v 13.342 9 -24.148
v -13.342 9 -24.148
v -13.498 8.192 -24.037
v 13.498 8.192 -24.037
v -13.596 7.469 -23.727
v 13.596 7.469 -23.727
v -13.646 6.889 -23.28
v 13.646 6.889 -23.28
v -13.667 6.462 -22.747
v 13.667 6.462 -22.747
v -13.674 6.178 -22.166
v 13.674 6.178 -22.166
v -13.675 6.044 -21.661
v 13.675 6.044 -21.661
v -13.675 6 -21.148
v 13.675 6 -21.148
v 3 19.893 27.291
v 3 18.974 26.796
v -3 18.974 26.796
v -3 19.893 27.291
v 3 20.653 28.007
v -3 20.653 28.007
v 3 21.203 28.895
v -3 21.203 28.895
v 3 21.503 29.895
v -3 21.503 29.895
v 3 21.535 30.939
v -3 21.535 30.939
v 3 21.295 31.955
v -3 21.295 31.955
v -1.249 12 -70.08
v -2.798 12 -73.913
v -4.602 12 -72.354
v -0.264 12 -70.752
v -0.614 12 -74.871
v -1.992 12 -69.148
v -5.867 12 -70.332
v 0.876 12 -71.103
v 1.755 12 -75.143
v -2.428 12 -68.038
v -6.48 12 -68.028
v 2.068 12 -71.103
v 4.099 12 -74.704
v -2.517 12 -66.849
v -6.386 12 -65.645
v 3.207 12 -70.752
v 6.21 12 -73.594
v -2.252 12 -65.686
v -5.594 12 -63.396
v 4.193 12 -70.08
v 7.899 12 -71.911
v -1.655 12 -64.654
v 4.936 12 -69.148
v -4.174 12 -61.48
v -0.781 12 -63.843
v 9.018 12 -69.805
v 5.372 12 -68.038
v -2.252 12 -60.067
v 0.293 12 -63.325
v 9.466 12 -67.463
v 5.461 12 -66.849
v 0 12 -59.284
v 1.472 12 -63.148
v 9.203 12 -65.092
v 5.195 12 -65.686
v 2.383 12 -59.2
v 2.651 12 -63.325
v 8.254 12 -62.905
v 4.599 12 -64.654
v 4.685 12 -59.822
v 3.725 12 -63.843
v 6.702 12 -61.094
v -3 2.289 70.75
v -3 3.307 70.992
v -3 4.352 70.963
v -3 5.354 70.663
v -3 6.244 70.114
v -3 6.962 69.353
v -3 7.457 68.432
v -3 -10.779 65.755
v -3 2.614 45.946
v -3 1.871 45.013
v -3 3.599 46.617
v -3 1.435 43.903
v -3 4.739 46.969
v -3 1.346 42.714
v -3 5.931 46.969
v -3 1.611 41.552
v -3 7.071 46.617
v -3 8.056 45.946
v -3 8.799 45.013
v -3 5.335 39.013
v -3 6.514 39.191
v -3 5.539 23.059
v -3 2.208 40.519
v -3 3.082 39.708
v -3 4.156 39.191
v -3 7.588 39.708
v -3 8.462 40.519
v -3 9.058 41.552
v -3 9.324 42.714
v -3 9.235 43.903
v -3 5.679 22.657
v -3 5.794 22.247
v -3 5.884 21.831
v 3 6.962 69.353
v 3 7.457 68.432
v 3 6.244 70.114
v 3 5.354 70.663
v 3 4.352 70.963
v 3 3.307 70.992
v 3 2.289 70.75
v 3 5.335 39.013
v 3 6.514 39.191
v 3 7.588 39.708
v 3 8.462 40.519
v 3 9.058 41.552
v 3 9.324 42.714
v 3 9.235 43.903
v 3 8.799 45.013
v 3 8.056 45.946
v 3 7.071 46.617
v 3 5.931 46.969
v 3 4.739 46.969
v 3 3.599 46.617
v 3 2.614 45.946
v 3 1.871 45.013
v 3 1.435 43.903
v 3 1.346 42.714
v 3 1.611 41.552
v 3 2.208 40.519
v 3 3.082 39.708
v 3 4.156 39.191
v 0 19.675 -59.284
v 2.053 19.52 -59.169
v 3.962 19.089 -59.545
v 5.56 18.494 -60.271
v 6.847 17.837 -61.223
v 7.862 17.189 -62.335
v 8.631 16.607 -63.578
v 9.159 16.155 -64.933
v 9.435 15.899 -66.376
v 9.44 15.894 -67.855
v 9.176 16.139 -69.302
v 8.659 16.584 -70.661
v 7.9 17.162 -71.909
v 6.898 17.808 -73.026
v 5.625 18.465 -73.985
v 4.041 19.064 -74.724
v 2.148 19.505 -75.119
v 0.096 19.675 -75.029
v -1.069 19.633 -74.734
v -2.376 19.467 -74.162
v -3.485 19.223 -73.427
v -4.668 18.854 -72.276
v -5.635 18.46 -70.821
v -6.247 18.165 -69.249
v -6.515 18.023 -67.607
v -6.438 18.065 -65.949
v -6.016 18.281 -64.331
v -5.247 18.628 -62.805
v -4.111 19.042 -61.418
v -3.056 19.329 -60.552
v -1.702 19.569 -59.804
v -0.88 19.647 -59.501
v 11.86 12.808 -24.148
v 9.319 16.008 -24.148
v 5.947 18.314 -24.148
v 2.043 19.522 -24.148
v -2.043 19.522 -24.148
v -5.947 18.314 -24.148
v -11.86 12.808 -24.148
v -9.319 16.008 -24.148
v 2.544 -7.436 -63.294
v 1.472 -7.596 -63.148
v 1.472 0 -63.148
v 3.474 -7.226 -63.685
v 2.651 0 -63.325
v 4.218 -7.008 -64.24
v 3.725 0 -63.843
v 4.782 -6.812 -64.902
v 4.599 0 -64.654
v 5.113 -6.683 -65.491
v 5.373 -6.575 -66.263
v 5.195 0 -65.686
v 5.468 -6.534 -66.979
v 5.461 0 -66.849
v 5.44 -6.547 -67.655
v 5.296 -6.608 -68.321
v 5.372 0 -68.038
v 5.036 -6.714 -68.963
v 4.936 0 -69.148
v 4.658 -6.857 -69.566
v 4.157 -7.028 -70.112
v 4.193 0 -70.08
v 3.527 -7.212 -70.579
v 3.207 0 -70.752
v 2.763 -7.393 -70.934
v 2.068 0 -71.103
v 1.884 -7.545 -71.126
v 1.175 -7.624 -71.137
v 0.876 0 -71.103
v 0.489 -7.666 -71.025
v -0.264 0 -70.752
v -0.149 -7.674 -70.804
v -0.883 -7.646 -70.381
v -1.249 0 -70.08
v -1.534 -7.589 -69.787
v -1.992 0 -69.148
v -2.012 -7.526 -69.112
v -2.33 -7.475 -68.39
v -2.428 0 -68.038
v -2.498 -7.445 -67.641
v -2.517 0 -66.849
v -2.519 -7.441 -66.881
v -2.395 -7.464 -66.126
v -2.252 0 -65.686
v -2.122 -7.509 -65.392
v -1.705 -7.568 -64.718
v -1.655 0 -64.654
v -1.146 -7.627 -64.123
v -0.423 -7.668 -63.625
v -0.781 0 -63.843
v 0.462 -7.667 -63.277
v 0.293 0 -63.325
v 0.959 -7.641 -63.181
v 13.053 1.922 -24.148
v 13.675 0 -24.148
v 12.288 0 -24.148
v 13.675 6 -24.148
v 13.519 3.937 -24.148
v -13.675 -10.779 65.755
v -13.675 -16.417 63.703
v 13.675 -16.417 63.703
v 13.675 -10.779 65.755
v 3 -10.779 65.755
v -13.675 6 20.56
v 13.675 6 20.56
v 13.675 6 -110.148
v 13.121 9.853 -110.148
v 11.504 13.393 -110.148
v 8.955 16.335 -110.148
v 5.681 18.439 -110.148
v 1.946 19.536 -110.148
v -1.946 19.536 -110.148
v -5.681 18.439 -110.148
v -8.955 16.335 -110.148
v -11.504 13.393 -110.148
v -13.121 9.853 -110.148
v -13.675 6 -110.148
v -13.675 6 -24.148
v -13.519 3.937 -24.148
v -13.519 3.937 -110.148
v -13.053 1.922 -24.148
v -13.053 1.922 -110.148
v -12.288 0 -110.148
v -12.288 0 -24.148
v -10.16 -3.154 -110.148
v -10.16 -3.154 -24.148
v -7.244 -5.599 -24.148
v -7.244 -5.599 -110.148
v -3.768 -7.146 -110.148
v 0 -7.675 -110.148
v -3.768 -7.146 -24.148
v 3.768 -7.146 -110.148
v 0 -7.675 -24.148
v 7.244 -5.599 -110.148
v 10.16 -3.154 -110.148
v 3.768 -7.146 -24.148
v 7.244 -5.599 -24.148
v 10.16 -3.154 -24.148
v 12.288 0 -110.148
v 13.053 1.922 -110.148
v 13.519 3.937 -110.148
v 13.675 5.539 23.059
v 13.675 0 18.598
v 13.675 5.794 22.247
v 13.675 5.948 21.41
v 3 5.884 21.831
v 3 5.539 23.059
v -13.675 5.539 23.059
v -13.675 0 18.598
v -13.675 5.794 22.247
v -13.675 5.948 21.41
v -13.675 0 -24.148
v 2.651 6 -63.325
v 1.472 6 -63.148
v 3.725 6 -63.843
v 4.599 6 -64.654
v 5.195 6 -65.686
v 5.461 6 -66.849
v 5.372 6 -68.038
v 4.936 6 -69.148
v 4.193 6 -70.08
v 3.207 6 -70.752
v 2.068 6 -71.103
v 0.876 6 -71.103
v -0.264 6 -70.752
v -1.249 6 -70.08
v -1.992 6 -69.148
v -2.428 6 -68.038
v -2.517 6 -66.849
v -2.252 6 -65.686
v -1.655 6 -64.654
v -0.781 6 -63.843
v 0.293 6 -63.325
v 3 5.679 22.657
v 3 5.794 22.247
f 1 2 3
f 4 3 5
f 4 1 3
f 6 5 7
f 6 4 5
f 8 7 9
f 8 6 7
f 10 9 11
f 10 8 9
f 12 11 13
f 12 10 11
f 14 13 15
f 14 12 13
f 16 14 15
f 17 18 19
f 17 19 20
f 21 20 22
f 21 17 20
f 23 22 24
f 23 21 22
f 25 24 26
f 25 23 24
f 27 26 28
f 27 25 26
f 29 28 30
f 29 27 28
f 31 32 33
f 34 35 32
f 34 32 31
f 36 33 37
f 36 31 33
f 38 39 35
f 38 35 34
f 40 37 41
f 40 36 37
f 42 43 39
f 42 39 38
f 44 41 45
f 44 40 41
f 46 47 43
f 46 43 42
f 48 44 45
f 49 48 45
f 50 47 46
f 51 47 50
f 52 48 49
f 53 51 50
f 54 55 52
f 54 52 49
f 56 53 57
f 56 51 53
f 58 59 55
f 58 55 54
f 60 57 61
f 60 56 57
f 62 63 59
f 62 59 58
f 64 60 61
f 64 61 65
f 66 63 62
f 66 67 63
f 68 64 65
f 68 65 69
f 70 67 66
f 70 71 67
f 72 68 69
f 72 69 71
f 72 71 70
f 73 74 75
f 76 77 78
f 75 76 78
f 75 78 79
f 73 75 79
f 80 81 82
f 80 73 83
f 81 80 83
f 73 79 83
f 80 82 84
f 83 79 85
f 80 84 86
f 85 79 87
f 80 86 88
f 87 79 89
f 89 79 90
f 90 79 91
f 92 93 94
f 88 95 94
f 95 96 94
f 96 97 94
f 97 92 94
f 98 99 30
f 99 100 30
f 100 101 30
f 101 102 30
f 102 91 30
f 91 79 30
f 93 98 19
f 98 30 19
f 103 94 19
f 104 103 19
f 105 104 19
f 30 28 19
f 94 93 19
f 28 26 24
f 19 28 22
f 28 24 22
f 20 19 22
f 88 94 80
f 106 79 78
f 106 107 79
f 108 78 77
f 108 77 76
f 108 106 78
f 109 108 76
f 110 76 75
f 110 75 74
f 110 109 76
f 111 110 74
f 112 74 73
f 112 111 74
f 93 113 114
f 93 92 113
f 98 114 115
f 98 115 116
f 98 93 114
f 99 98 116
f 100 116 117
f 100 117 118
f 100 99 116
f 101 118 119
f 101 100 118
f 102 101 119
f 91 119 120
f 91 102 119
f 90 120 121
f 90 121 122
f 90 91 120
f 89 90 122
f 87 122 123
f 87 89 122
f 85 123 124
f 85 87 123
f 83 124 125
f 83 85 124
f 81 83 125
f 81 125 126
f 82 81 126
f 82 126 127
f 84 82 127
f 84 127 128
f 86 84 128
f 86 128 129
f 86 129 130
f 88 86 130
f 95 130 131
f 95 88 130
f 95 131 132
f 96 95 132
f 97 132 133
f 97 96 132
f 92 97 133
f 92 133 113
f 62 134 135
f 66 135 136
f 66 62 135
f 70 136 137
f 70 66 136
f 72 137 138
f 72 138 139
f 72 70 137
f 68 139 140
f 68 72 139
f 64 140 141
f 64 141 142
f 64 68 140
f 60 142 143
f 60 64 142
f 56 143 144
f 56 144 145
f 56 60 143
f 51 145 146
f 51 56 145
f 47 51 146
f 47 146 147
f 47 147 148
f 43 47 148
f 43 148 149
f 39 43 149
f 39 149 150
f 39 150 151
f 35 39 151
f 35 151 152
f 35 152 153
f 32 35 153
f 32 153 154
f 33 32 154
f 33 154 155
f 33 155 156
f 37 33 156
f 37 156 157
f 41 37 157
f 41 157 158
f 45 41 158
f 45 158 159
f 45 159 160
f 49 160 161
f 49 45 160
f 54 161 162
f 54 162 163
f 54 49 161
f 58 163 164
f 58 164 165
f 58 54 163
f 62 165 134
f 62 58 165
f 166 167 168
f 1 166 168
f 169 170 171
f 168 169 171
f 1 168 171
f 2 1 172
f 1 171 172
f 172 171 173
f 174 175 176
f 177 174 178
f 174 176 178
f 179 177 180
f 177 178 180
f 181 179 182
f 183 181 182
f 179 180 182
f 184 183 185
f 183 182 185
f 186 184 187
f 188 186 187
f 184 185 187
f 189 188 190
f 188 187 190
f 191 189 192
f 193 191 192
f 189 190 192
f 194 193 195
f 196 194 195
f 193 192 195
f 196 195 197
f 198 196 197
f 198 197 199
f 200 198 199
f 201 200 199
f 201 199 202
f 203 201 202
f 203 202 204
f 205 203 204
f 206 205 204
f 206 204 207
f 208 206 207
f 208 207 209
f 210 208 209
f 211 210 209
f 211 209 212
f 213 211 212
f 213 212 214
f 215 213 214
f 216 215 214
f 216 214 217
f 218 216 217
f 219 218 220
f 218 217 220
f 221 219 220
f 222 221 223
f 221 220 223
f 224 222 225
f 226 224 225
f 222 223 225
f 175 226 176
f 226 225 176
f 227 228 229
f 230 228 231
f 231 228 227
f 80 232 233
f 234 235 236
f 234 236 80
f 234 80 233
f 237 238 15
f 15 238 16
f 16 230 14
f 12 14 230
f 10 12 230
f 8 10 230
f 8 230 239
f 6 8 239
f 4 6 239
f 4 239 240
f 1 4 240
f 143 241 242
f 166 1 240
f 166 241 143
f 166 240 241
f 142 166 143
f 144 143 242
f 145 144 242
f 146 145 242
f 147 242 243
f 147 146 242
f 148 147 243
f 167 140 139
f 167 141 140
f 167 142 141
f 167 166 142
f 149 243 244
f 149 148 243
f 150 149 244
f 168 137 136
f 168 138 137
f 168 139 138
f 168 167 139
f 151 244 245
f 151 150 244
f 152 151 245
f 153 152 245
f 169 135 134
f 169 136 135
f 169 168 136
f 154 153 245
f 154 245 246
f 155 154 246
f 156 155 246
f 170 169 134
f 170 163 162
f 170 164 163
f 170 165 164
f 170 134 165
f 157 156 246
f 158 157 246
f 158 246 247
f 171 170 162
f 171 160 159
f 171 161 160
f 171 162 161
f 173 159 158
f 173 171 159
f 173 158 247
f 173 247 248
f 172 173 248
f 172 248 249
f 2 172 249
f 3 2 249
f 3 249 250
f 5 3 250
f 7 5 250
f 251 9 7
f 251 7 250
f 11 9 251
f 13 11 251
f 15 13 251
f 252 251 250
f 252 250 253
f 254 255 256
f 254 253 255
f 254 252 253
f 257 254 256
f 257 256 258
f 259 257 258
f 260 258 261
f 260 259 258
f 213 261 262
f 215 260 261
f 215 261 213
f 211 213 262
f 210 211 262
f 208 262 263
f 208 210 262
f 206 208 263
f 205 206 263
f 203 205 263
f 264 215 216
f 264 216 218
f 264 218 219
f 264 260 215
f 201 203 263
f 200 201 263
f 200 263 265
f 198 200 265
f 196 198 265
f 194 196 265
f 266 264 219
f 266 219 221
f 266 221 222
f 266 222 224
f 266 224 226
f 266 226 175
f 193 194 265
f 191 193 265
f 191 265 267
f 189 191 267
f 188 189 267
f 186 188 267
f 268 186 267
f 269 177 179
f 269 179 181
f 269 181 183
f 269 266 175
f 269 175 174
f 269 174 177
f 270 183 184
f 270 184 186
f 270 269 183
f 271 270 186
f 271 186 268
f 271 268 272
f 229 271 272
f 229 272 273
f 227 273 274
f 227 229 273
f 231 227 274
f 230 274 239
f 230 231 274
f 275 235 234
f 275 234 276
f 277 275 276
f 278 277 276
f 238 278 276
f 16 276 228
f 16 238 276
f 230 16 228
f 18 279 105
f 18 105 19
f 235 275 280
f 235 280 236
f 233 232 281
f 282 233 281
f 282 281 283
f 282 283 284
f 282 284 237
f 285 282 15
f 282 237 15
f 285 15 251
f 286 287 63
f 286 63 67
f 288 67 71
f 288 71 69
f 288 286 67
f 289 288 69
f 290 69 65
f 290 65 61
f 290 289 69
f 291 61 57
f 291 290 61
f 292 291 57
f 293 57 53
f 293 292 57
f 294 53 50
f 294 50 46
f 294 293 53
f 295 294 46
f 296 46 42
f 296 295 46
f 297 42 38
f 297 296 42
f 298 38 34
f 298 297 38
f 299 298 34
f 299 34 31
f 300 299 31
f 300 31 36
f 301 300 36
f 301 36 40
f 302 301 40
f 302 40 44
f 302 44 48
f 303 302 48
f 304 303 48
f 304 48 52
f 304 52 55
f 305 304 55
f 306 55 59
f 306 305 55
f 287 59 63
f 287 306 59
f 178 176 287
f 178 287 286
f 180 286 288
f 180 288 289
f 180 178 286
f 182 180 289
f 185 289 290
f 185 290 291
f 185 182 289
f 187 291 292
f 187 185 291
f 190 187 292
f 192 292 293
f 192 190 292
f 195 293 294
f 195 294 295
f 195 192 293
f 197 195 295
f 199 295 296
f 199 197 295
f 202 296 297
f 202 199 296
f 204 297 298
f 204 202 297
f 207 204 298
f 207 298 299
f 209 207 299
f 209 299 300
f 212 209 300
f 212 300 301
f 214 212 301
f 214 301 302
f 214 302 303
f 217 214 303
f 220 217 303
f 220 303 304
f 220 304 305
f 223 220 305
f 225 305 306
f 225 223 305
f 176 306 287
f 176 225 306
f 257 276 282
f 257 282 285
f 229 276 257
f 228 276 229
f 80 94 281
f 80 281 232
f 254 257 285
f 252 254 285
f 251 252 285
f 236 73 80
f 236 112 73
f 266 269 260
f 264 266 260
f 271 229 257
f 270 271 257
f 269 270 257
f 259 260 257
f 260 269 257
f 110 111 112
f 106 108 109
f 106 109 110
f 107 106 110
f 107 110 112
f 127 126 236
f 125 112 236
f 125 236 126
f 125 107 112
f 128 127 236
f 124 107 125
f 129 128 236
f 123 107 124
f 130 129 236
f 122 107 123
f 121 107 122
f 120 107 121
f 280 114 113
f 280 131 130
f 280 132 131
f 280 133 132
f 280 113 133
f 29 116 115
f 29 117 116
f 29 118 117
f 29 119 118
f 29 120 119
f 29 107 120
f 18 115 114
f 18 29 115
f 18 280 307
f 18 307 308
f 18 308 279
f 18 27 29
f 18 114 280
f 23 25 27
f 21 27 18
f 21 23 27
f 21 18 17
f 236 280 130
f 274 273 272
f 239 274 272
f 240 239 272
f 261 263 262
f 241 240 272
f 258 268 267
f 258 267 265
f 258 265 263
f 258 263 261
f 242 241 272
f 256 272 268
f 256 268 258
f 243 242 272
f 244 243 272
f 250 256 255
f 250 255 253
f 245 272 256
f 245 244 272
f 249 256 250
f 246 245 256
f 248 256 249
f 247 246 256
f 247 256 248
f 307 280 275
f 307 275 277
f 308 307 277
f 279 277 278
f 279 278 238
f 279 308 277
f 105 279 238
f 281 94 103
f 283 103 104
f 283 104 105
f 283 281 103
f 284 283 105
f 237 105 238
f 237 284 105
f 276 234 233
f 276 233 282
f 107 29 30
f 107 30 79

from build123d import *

# Parameters (mm, degrees)
SKETCH1_W           = 46
SKETCH1_H           = 6
BOSS_EXTRUDE1_DEPTH = 27.35
BOSS_EXTRUDE2_DEPTH = 27.35
FILLET1_R           = 7
BOSS_EXTRUDE3_DEPTH = 86
FILLET2_R           = 3
SKETCH5_R           = 8
SKETCH5_R_2         = 4
CUT_EXTRUDE1_DEPTH  = 116.185263628
SKETCH6_R           = 4
CUT_EXTRUDE2_DEPTH  = 116.185263741
SKETCH7_R           = 4
CUT_EXTRUDE3_DEPTH  = 116.185263741
SKETCH8_R           = 8
SKETCH8_R_2         = 4
BOSS_EXTRUDE4_DEPTH = 6
SKETCH9_R           = 8
SKETCH9_R_2         = 4
BOSS_EXTRUDE5_DEPTH = 6
SKETCH11_R          = 4
BOSS_EXTRUDE6_DEPTH = 3


with BuildPart() as part:
    # Sketch1 → Boss-Extrude1 (new body)
    with BuildSketch(Plane(origin=(0, 0, 0), x_dir=(0, 0, -1), z_dir=(1, 0, 0))):
        with Locations((1.147704591, 3)):
            Rectangle(SKETCH1_W, SKETCH1_H)
    extrude(amount=-BOSS_EXTRUDE1_DEPTH)

    # Sketch2 → Boss-Extrude2 (add)
    with BuildSketch(Plane(origin=(0, 0, 0), x_dir=(0, 0, -1), z_dir=(1, 0, 0))):
        Polygon((-21.852295409, 6), (-65.755273625, -10.778811155), (-63.703152765, -16.41696688), (-18.597906967, 0), align=None)
    extrude(amount=-BOSS_EXTRUDE2_DEPTH)

    # Fillet1
    fillet1_edges = [part.edges().sort_by_distance(p)[0] for p in [
        (-13.675, 6, 21.852295409),
    ]]
    fillet(fillet1_edges, radius=FILLET1_R)

    # Sketch3 → Boss-Extrude3 (add)
    with BuildSketch(Plane(origin=(0, 0, -24.147704591), x_dir=(-1, 0, 0), z_dir=(0, 0, -1))):
        with BuildLine():
            ThreePointArc((27.35, 6), (13.675, 19.675), (0, 6))
            Line((0, 6), (27.35, 6))
        make_face()
        with BuildLine():
            Line((25.963434603, 0), (1.386565397, 0))
            ThreePointArc((1.386565397, 0), (13.675, -7.675), (25.963434603, 0))
        make_face()
        with BuildLine():
            Line((27.35, 6), (0, 6))
            ThreePointArc((0, 6), (0.351149802, 2.920935061), (1.386565397, 0))
            Line((1.386565397, 0), (25.963434603, 0))
            ThreePointArc((25.963434603, 0), (26.998850198, 2.920935061), (27.35, 6))
        make_face()
    extrude(amount=BOSS_EXTRUDE3_DEPTH)

    # Fillet2
    # the kernel refuses this fillet: 3 mm, written as the material it adds along each edge
    with BuildSketch(Plane(origin=(0, 6, -24.147704591), x_dir=(0, 0, 1), z_dir=(-1, 0, 0))) as fillet2_piece_1_section:
        with BuildLine():
            CenterArc((FILLET2_R, FILLET2_R), FILLET2_R, 180, 90)
            Line((0, FILLET2_R), (0, 0))
            Line((0, 0), (FILLET2_R, 0))
        make_face()
    fillet2_piece_1 = extrude(amount=27.35, mode=Mode.PRIVATE)
    fillet2_piece_1 = fillet2_piece_1 & Plane(origin=(-13.675, 6, -23.467343504), x_dir=(-1, 0, 0), z_dir=(0, 0, 1)) * Cylinder(13.675, 67, mode=Mode.PRIVATE)
    add(fillet2_piece_1)

    # Sketch5 → Cut-Extrude1 (cut, through all)
    with BuildSketch(Plane(origin=(0, 0, 0), x_dir=(1, 0, 0), z_dir=(0, 1, 0))):
        with Locations(Location((-12.203148076, 67.147704591, 0), (0, 0, 259.398243128))):
            Circle(SKETCH5_R)
        with Locations(Location((-12.203148076, 67.147704591, 0), (0, 0, 248.409956221))):
            Circle(SKETCH5_R_2, mode=Mode.SUBTRACT)
    extrude(amount=CUT_EXTRUDE1_DEPTH, mode=Mode.SUBTRACT)

    # Sketch6 → Cut-Extrude2 (cut, through all)
    with BuildSketch(Plane(origin=(0, 0, 0), x_dir=(1, 0, 0), z_dir=(0, 1, 0))):
        with Locations((-12.203148076, 67.147704591)):
            Circle(SKETCH6_R)
    extrude(amount=CUT_EXTRUDE2_DEPTH, mode=Mode.SUBTRACT)

    # Sketch7 → Cut-Extrude3 (cut, through all)
    with BuildSketch(Plane(origin=(0, 0, 0), x_dir=(1, 0, 0), z_dir=(0, 1, 0))):
        with Locations(Location((-12.203148076, 67.147704591, 0), (0, 0, 270))):
            Circle(SKETCH7_R)
    extrude(amount=-CUT_EXTRUDE3_DEPTH, mode=Mode.SUBTRACT)

    # Sketch8 → Boss-Extrude4 (add)
    with BuildSketch(Plane(origin=(0, 0, 0), x_dir=(1, 0, 0), z_dir=(0, 1, 0))):
        with Locations(Location((-12.203148076, 67.147704591, 0), (0, 0, 259.398243128))):
            Circle(SKETCH8_R)
        with Locations(Location((-12.203148076, 67.147704591, 0), (0, 0, 270))):
            Circle(SKETCH8_R_2, mode=Mode.SUBTRACT)
    extrude(amount=BOSS_EXTRUDE4_DEPTH)

    # Sketch9 → Boss-Extrude5 (add)
    with BuildSketch(Plane(origin=(0, 6, 0), x_dir=(1, 0, 0), z_dir=(0, 1, 0))):
        with Locations(Location((-12.203148076, 67.147704591, 0), (0, 0, 259.398243128))):
            Circle(SKETCH9_R)
        with Locations(Location((-12.203148076, 67.147704591, 0), (0, 0, 270))):
            Circle(SKETCH9_R_2, mode=Mode.SUBTRACT)
    extrude(amount=BOSS_EXTRUDE5_DEPTH)


with BuildPart() as part_1:
    # Body-Move/Copy1: moved
    add(part.part.moved(Location((13.675, 0, 0))))

    # Sketch11 → Boss-Extrude6 (add, symmetric)
    with BuildSketch(Plane(origin=(0, 0, 0), x_dir=(0, 0, -1), z_dir=(1, 0, 0))):
        with BuildLine():
            Line((-65.755273625, -10.778811155), (-21.830832444, 5.883719563))
            Line((-21.830832444, 5.883719563), (-26.796391829, 18.97353316))
            ThreePointArc((-26.796391829, 18.97353316), (-28.894991358, 21.202538099), (-31.955069824, 21.294748649))
            Line((-31.955069824, 21.294748649), (-68.432005738, 7.457394118))
            ThreePointArc((-68.432005738, 7.457394118), (-70.663039196, 5.354278937), (-70.749698163, 2.289463448))
            Line((-70.749698163, 2.289463448), (-65.755273625, -10.778811155))
        make_face()
        with Locations((-43.013345846, 5.334970097)):
            Circle(SKETCH11_R, mode=Mode.SUBTRACT)
    extrude(amount=BOSS_EXTRUDE6_DEPTH, both=True)


solid = part_1.part
